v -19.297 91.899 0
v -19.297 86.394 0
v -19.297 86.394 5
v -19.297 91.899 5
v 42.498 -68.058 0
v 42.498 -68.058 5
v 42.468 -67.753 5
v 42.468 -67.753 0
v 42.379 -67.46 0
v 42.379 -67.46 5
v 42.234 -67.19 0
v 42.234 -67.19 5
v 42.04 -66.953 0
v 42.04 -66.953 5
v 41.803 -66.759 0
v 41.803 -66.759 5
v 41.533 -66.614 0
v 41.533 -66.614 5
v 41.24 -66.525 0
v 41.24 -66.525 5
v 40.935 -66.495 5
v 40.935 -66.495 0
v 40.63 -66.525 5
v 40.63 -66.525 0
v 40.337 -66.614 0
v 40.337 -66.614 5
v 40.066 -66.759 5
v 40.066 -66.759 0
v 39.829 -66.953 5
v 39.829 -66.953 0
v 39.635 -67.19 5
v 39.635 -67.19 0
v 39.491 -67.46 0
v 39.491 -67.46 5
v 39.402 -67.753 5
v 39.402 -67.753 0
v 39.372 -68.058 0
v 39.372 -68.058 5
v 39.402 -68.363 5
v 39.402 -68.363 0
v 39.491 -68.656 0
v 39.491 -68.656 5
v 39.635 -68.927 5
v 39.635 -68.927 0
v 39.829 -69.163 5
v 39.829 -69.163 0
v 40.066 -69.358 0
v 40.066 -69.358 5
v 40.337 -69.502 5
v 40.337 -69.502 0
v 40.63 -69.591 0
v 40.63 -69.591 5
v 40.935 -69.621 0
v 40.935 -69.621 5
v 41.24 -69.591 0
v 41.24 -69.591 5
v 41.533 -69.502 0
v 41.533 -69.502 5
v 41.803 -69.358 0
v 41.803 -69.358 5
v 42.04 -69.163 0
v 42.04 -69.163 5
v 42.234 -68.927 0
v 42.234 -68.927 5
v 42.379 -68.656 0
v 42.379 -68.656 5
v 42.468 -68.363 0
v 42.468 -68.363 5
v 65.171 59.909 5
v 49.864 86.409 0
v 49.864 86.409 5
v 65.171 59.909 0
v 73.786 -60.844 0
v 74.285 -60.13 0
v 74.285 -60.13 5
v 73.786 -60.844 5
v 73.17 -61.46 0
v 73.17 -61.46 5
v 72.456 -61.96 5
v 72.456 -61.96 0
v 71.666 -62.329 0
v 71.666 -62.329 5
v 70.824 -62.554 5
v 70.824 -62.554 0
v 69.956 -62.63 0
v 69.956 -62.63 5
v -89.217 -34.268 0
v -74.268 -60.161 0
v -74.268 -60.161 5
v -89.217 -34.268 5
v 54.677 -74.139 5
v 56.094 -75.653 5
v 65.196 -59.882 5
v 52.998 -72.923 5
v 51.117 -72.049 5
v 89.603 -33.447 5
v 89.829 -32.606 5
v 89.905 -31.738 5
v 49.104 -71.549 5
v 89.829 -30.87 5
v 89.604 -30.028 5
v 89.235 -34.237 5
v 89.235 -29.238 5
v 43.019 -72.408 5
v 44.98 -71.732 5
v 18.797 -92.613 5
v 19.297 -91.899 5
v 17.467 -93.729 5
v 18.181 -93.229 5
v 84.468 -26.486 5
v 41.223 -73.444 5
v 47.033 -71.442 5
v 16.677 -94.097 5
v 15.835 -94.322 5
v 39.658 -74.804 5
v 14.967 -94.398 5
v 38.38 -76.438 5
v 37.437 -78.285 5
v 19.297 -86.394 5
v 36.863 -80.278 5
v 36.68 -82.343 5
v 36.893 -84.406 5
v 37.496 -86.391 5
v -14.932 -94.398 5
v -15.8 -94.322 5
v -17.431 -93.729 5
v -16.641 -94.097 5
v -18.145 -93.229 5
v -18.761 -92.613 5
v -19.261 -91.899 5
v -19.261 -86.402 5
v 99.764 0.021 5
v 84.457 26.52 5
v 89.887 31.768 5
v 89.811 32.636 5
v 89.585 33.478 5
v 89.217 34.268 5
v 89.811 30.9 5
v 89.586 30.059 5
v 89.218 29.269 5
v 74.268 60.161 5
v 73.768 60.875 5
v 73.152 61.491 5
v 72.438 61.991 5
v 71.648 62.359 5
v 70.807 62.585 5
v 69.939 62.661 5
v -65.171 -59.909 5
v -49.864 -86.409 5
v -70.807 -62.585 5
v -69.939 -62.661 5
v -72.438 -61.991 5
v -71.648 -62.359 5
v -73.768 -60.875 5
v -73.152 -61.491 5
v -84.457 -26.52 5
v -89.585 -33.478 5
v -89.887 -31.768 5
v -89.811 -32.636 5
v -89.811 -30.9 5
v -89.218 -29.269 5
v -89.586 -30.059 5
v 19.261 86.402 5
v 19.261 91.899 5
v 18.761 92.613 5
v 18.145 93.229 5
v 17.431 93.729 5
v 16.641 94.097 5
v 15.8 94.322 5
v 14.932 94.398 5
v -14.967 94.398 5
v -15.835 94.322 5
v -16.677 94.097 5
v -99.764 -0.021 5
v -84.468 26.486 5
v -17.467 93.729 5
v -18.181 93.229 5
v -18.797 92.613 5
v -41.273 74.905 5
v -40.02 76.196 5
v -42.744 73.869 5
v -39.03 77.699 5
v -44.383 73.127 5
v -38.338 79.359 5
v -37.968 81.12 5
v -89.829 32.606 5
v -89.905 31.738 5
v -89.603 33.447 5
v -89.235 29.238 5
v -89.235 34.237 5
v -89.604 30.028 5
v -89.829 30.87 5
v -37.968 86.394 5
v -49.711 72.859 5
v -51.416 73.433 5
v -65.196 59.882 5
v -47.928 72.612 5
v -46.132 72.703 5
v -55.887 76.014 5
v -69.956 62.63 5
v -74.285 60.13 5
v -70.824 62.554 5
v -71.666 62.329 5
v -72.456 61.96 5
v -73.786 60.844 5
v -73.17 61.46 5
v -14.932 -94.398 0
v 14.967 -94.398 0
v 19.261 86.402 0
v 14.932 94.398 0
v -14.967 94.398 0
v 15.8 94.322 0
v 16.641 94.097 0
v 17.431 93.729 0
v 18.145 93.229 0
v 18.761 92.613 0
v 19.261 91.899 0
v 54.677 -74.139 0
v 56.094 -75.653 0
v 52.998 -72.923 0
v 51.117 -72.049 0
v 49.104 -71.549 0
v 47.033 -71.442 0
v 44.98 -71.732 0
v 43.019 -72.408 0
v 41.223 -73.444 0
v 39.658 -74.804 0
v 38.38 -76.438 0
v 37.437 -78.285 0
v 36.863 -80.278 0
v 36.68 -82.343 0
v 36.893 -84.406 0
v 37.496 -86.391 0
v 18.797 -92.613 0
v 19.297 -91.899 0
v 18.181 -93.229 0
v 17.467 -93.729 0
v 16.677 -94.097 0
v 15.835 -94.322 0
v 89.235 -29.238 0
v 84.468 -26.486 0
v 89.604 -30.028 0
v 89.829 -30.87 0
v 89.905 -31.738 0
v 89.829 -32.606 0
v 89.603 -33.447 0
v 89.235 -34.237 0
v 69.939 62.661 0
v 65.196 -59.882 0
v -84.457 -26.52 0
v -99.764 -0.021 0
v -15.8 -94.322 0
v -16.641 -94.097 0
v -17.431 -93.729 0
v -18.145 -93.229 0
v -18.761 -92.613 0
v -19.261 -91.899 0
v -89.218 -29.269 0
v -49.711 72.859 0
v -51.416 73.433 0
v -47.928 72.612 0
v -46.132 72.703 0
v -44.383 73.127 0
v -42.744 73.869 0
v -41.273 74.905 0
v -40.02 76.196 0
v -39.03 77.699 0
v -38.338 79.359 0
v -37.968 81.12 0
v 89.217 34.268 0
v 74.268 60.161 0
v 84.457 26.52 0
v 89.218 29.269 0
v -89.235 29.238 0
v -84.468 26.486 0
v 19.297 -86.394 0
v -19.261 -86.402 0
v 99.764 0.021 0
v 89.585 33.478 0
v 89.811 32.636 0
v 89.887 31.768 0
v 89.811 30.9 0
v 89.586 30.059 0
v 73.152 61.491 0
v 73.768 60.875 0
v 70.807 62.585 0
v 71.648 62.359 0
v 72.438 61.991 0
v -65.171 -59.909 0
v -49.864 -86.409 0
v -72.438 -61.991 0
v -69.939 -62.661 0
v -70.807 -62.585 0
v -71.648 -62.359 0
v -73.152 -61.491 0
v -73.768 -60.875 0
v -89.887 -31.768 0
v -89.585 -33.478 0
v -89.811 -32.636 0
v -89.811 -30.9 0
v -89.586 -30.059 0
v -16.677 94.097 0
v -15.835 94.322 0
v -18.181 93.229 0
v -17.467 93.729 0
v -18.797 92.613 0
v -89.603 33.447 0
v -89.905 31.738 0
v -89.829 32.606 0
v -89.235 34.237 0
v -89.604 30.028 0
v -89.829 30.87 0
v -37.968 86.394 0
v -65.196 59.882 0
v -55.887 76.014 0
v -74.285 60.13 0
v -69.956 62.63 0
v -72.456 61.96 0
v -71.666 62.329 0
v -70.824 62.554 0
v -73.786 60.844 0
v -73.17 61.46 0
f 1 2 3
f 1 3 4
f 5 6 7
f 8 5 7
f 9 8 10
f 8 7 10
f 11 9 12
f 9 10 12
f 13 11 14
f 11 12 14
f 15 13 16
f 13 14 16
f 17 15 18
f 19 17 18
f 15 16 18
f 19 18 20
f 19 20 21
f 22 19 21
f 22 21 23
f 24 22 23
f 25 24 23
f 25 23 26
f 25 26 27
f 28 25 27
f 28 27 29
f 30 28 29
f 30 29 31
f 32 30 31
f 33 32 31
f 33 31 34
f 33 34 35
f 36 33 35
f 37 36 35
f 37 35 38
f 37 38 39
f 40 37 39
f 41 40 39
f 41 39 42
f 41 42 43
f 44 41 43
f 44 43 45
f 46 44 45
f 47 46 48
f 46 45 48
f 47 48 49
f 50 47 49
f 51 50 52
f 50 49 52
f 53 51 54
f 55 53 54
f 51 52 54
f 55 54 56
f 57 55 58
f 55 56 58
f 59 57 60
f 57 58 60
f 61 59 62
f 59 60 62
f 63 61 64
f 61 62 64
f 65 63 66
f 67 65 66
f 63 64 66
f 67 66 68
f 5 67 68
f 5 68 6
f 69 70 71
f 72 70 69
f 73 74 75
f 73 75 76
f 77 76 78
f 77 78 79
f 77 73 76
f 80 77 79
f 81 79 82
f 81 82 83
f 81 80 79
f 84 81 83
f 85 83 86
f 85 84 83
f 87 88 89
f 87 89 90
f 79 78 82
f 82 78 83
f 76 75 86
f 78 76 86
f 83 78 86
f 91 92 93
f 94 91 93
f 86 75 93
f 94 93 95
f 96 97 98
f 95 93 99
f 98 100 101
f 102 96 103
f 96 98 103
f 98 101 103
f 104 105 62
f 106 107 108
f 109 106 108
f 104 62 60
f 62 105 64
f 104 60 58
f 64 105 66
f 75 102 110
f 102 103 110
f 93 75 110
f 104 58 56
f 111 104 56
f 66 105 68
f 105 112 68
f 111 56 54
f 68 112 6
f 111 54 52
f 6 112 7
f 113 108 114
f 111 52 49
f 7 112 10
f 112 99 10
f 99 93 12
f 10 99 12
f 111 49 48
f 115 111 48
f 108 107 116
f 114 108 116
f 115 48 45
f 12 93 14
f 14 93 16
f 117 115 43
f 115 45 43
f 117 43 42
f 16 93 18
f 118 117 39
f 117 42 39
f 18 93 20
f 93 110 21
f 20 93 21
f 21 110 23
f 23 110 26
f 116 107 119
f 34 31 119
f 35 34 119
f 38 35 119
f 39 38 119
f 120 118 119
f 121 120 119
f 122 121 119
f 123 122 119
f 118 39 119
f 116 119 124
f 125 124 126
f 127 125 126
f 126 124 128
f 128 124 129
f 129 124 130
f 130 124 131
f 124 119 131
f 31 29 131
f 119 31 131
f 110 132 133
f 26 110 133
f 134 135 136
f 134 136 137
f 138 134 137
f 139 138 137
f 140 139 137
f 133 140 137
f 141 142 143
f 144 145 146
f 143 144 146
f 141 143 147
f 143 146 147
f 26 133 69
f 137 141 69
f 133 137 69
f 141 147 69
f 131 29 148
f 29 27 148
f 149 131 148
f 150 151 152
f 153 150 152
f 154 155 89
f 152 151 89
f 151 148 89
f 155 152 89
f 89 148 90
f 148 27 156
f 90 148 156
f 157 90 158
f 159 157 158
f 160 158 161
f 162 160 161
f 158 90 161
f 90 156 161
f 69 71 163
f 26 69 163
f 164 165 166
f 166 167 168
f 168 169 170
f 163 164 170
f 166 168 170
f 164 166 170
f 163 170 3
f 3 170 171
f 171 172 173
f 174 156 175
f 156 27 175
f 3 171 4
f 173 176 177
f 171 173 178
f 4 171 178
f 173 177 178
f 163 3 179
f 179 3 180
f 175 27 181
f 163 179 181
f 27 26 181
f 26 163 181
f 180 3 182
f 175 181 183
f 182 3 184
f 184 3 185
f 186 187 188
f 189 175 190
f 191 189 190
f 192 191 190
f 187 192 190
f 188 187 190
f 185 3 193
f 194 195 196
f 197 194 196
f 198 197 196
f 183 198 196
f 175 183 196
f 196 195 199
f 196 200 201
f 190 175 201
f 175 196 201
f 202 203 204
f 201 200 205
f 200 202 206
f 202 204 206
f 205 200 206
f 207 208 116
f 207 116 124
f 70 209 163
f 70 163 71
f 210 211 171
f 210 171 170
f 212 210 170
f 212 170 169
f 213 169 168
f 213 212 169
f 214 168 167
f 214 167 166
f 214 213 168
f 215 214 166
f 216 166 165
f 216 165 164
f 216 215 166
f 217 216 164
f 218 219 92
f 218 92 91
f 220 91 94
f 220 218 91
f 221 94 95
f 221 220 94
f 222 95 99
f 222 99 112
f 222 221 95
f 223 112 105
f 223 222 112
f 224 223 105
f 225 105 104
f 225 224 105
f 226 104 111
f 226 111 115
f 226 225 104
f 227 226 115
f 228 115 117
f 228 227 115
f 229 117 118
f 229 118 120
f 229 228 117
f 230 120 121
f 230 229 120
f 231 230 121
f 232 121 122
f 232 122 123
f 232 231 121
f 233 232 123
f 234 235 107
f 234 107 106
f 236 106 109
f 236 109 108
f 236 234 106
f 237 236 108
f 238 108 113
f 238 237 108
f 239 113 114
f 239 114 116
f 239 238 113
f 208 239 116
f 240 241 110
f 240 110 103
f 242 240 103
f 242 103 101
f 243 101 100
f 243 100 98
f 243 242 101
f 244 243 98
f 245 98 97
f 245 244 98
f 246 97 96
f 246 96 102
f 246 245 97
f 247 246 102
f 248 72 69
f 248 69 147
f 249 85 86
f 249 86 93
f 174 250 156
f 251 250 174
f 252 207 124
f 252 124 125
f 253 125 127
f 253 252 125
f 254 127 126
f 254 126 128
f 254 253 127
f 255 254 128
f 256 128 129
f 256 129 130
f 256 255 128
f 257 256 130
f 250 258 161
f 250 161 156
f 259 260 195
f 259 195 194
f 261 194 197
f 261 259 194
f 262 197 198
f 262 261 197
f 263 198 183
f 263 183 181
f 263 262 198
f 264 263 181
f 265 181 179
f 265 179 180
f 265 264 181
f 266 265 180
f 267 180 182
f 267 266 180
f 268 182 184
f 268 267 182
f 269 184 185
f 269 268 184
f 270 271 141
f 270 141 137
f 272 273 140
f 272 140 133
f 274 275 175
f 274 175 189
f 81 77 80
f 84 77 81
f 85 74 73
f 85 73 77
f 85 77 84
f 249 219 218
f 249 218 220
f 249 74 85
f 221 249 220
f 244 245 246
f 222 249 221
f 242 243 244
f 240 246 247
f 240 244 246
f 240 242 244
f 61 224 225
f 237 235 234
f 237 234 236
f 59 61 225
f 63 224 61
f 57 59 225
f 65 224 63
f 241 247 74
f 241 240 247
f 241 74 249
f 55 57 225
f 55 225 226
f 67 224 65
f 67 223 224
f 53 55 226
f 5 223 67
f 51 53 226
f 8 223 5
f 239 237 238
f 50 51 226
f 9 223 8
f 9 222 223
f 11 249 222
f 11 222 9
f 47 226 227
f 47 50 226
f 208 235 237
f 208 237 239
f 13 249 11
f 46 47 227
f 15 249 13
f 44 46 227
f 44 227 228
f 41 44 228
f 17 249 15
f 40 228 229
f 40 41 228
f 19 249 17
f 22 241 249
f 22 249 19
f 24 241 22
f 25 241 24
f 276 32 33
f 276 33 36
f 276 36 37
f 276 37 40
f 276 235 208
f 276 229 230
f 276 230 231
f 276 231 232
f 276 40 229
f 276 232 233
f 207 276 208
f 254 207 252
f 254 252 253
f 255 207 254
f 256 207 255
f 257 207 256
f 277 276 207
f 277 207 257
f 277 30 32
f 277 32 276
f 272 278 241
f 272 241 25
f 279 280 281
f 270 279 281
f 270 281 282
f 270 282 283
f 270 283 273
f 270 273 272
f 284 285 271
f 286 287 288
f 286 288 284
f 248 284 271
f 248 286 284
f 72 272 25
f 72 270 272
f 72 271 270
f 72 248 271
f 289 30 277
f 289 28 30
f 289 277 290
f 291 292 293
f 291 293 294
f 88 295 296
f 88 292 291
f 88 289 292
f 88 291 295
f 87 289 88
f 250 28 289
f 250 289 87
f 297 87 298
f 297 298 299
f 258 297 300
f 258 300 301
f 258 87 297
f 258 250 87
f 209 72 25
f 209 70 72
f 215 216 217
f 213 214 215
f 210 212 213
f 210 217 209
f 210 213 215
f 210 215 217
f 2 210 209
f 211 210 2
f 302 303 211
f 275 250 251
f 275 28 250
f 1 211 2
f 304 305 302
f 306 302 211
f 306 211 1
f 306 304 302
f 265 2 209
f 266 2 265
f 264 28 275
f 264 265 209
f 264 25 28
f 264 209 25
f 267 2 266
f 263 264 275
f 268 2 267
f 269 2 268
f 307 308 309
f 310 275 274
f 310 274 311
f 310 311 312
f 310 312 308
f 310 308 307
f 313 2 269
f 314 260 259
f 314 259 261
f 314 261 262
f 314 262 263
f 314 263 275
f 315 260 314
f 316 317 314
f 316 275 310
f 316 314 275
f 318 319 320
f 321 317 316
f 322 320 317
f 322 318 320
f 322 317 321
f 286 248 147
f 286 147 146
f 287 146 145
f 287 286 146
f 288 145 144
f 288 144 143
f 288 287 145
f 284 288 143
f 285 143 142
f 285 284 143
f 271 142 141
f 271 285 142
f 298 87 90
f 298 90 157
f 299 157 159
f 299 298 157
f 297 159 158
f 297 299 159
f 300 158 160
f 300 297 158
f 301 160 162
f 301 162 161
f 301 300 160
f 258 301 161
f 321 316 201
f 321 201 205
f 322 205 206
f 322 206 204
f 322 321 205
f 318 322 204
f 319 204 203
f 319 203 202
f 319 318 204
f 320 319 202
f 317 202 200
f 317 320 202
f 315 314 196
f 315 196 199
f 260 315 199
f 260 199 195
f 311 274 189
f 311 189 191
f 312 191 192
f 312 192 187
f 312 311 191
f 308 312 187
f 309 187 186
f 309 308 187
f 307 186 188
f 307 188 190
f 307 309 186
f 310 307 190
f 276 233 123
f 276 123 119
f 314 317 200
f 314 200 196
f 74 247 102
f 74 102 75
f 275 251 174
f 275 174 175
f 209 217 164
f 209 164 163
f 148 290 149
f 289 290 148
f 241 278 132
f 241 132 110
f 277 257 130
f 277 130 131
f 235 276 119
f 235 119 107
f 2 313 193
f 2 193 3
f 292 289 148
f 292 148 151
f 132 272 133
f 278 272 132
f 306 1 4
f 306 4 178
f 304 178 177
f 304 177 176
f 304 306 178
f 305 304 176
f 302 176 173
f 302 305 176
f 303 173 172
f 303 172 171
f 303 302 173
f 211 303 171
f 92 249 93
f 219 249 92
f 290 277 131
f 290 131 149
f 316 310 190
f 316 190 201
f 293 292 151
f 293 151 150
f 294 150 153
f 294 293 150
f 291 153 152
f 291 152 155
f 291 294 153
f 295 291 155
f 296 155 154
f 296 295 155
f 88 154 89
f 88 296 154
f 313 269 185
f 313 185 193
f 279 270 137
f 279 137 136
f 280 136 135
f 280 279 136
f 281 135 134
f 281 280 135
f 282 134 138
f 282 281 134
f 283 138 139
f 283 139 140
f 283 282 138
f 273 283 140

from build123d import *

# Parameters (mm, degrees)
SALIENTE_EXTRUIR1_DEPTH = 5
CROQUIS2_R              = 1.563071694
CORTAR_EXTRUIR1_DEPTH   = 10


with BuildPart() as part:
    # Croquis1 → Saliente-Extruir1 (new body)
    with BuildSketch(Plane.XY):
        with BuildLine():
            ThreePointArc((-51.415727165, 73.433311131), (-42.744189857, 73.869405728), (-37.96791411, 81.120124849))
            Line((-37.96791411, 81.120124849), (-37.96791411, 86.394261487))
            Line((-37.96791411, 86.394261487), (-19.296868546, 86.394261487))
            Line((-19.296868546, 86.394261487), (-19.296868546, 91.89912361))
            ThreePointArc((-19.296868546, 91.89912361), (-17.466810584, 93.728616325), (-14.967256479, 94.398231899))
            Line((-14.967256479, 94.398231899), (14.931670067, 94.398231899))
            ThreePointArc((14.931670067, 94.398231899), (17.431224172, 93.728616325), (19.261282134, 91.89912361))
            Line((19.261282134, 91.89912361), (19.261282134, 86.402202311))
            Line((19.261282134, 86.402202311), (49.864249238, 86.408504811))
            Line((49.864249238, 86.408504811), (65.171190916, 59.908709118))
            Line((65.171190916, 59.908709118), (69.938541359, 62.661140179))
            ThreePointArc((69.938541359, 62.661140179), (72.437957507, 61.991009851), (74.267638657, 60.161140285))
            Line((74.267638657, 60.161140285), (89.21710193, 34.267910351))
            ThreePointArc((89.21710193, 34.267910351), (89.886974885, 31.768425211), (89.217616699, 29.268802168))
            Line((89.217616699, 29.268802168), (84.457143211, 26.520341518))
            Line((84.457143211, 26.520341518), (99.764084889, 0.020545825))
            Line((99.764084889, 0.020545825), (84.468059462, -26.485552369))
            Line((84.468059462, -26.485552369), (89.235409905, -29.237983431))
            ThreePointArc((89.235409905, -29.237983431), (89.904768091, -31.737606474), (89.234895136, -34.237091613))
            Line((89.234895136, -34.237091613), (74.285431863, -60.130321548))
            ThreePointArc((74.285431863, -60.130321548), (72.455750713, -61.960191114), (69.956334565, -62.630321442))
            Line((69.956334565, -62.630321442), (65.195861077, -59.881860793))
            Line((65.195861077, -59.881860793), (56.094468632, -75.653435114))
            ThreePointArc((56.094468632, -75.653435114), (42.096374739, -72.88292625), (37.495566471, -86.390513573))
            Line((37.495566471, -86.390513573), (19.296868546, -86.394261487))
            Line((19.296868546, -86.394261487), (19.296868546, -91.89912361))
            ThreePointArc((19.296868546, -91.89912361), (17.466810584, -93.728616325), (14.967256479, -94.398231899))
            Line((14.967256479, -94.398231899), (-14.931670067, -94.398231899))
            ThreePointArc((-14.931670067, -94.398231899), (-17.431224172, -93.728616325), (-19.261282134, -91.89912361))
            Line((-19.261282134, -91.89912361), (-19.261282134, -86.402202311))
            Line((-19.261282134, -86.402202311), (-49.864249238, -86.408504811))
            Line((-49.864249238, -86.408504811), (-65.171190916, -59.908709118))
            Line((-65.171190916, -59.908709118), (-69.938541359, -62.661140179))
            ThreePointArc((-69.938541359, -62.661140179), (-72.437957507, -61.991009851), (-74.267638657, -60.161140285))
            Line((-74.267638657, -60.161140285), (-89.21710193, -34.267910351))
            ThreePointArc((-89.21710193, -34.267910351), (-89.886974885, -31.768425211), (-89.217616699, -29.268802168))
            Line((-89.217616699, -29.268802168), (-84.457143211, -26.520341518))
            Line((-84.457143211, -26.520341518), (-99.764084889, -0.020545825))
            Line((-99.764084889, -0.020545825), (-84.468059462, 26.485552369))
            Line((-84.468059462, 26.485552369), (-89.235409905, 29.237983431))
            ThreePointArc((-89.235409905, 29.237983431), (-89.904768091, 31.737606474), (-89.234895136, 34.237091613))
            Line((-89.234895136, 34.237091613), (-74.285431863, 60.130321548))
            ThreePointArc((-74.285431863, 60.130321548), (-72.455750713, 61.960191114), (-69.956334565, 62.630321442))
            Line((-69.956334565, 62.630321442), (-65.195861077, 59.881860793))
            Line((-65.195861077, 59.881860793), (-55.88668677, 76.013702989))
            Line((-55.88668677, 76.013702989), (-51.415727165, 73.433311131))
        make_face()
    extrude(amount=SALIENTE_EXTRUIR1_DEPTH)

    # Croquis2 → Cortar-Extruir1 (cut)
    with BuildSketch(Plane.XY.offset(5)):
        with Locations((40.934728827, -68.058233997)):
            Circle(CROQUIS2_R)
    extrude(amount=-CORTAR_EXTRUIR1_DEPTH, mode=Mode.SUBTRACT)


solid = part.part
